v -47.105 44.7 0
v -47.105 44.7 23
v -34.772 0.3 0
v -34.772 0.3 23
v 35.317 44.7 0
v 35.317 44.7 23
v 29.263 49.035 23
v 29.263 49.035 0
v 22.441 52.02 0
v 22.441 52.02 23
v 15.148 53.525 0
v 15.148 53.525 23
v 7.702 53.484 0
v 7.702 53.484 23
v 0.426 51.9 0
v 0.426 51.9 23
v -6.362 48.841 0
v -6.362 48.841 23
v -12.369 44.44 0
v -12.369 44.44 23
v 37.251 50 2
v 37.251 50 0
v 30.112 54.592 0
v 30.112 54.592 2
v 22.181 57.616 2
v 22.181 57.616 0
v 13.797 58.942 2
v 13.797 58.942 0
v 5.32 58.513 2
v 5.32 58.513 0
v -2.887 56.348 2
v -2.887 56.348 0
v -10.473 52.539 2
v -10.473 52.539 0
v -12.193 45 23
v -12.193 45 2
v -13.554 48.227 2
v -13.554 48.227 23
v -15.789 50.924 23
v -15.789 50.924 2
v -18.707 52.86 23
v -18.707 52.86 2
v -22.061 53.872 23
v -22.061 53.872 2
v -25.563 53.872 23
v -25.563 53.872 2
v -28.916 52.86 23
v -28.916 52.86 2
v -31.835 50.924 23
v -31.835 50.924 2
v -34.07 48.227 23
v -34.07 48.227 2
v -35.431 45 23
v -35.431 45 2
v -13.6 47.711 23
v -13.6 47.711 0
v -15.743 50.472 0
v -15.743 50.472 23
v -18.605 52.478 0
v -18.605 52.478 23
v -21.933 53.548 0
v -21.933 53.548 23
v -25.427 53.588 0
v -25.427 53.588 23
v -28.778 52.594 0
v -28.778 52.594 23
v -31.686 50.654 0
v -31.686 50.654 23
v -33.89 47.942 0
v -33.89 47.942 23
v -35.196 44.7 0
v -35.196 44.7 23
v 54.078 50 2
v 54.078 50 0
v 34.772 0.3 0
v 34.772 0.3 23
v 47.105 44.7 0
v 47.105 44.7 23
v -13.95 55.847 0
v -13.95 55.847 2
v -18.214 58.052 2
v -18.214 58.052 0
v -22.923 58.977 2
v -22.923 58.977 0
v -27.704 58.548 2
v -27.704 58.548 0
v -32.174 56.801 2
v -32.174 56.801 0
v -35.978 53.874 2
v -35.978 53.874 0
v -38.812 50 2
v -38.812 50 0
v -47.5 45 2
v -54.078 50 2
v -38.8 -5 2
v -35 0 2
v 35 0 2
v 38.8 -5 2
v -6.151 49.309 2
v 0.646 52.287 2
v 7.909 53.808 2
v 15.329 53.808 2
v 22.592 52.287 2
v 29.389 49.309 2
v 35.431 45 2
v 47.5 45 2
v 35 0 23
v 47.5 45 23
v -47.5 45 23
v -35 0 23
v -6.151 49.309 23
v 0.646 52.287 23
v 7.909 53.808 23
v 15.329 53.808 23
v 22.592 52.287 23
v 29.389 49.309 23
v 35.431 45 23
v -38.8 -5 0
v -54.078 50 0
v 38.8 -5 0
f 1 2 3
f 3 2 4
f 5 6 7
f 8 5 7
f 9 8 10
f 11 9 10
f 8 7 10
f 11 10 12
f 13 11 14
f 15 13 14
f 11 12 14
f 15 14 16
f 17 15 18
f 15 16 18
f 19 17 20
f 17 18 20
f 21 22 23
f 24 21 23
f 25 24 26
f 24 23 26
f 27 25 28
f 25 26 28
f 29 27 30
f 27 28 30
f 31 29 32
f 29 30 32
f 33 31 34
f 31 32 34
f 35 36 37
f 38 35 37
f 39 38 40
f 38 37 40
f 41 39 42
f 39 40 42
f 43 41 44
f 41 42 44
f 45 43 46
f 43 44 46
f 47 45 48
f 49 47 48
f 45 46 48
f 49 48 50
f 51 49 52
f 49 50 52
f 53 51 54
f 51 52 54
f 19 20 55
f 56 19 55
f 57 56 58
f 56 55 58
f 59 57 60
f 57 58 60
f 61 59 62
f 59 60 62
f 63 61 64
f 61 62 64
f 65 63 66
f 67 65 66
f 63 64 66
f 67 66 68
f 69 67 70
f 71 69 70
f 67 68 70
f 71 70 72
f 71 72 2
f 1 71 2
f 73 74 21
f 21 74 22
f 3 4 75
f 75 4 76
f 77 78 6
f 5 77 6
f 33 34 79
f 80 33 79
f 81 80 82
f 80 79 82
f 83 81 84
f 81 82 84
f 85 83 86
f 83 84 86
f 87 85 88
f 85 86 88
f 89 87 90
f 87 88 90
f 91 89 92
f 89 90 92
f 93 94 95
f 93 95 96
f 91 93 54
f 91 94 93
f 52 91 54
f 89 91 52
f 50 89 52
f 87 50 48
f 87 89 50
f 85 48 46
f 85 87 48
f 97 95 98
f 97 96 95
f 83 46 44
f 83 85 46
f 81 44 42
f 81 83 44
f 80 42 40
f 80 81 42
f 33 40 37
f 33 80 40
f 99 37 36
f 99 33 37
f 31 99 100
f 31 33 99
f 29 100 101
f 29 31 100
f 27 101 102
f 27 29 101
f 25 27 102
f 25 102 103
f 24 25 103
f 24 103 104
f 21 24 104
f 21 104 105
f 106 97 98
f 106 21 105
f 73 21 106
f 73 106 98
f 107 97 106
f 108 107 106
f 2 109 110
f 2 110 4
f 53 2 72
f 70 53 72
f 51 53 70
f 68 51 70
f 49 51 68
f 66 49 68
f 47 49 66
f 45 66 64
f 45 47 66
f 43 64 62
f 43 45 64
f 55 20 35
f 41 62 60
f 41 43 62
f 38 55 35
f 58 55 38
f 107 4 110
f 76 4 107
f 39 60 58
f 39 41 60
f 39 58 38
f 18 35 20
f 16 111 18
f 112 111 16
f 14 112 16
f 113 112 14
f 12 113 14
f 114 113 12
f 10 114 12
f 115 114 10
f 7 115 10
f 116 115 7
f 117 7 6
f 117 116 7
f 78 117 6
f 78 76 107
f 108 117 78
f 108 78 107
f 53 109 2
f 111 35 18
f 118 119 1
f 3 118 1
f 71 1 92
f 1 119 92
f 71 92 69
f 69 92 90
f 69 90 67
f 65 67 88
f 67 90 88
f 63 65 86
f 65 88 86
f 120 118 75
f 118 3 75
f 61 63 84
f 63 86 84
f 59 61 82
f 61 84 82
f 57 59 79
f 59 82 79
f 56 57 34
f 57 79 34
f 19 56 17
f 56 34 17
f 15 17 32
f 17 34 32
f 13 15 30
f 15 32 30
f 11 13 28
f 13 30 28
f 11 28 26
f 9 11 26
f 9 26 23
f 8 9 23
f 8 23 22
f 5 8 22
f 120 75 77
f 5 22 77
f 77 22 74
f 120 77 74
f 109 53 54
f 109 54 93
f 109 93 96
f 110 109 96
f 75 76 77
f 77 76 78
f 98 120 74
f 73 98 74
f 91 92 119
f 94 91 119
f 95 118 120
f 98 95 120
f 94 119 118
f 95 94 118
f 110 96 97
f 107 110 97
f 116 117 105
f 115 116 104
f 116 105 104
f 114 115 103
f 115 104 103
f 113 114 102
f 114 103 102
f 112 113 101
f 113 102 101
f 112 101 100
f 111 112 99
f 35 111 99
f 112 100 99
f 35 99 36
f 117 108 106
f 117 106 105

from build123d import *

# Parameters (mm, degrees)
F2_DEPTH = 2
F3_DEPTH = 23
F5_DEPTH = 23


# Not quite as in the source:
# - a feature of the source that left no trace in its solid (it failed there, or was rolled back) is left out


with BuildPart() as f2:
    # F1 (on Top) → F2 (new body)
    with BuildSketch(Plane.XY):
        with BuildLine():
            ThreePointArc((37.2509612746, 50), (13.7972702688, 58.9420922887), (-10.4728523554, 52.5391410864))
            ThreePointArc((-10.4728523554, 52.5391410864), (-25.3288691863, 58.932170126), (-38.8117617996, 50))
            Line((-38.8117617996, 50), (-54.0782060256, 50))
            Line((-54.0782060256, 50), (-38.8004282479, -5))
            Line((-38.8004282479, -5), (38.8004282479, -5))
            Line((38.8004282479, -5), (54.0782060256, 50))
            Line((54.0782060256, 50), (37.2509612746, 50))
        make_face()
    extrude(amount=F2_DEPTH)

    # F0 (on Top) → F3 (join)
    with BuildSketch(Plane.XY):
        with BuildLine():
            Line((-35.4307118382, 45), (-47.5, 45))
            Line((-47.5, 45), (-35, 0))
            Line((-35, 0), (35, 0))
            Line((35, 0), (47.5, 45))
            Line((47.5, 45), (35.4307118382, 45))
            ThreePointArc((35.4307118382, 45), (11.6189500386, 54), (-12.192811761, 45))
            ThreePointArc((-12.192811761, 45), (-23.8117617996, 54), (-35.4307118382, 45))
        make_face()
    extrude(amount=F3_DEPTH)

    # F4 (on face) → F5 (cut, through all)
    with BuildSketch(Plane.XY.offset(23)):
        with BuildLine():
            ThreePointArc((35.3170512284, 44.7), (11.4242314878, 53.6994689692), (-12.3689964911, 44.4399020665))
            ThreePointArc((-12.3689964911, 44.4399020665), (-23.678456811, 53.6992405642), (-35.1959613762, 44.7))
            Line((-35.1959613762, 44.7), (-47.1053076385, 44.7))
            Line((-47.1053076385, 44.7), (-34.7719743051, 0.3))
            Line((-34.7719743051, 0.3), (34.7719743051, 0.3))
            Line((34.7719743051, 0.3), (47.1053076385, 44.7))
            Line((47.1053076385, 44.7), (35.3170512284, 44.7))
        make_face()
    extrude(amount=-F5_DEPTH, mode=Mode.SUBTRACT)


solid = f2.part
